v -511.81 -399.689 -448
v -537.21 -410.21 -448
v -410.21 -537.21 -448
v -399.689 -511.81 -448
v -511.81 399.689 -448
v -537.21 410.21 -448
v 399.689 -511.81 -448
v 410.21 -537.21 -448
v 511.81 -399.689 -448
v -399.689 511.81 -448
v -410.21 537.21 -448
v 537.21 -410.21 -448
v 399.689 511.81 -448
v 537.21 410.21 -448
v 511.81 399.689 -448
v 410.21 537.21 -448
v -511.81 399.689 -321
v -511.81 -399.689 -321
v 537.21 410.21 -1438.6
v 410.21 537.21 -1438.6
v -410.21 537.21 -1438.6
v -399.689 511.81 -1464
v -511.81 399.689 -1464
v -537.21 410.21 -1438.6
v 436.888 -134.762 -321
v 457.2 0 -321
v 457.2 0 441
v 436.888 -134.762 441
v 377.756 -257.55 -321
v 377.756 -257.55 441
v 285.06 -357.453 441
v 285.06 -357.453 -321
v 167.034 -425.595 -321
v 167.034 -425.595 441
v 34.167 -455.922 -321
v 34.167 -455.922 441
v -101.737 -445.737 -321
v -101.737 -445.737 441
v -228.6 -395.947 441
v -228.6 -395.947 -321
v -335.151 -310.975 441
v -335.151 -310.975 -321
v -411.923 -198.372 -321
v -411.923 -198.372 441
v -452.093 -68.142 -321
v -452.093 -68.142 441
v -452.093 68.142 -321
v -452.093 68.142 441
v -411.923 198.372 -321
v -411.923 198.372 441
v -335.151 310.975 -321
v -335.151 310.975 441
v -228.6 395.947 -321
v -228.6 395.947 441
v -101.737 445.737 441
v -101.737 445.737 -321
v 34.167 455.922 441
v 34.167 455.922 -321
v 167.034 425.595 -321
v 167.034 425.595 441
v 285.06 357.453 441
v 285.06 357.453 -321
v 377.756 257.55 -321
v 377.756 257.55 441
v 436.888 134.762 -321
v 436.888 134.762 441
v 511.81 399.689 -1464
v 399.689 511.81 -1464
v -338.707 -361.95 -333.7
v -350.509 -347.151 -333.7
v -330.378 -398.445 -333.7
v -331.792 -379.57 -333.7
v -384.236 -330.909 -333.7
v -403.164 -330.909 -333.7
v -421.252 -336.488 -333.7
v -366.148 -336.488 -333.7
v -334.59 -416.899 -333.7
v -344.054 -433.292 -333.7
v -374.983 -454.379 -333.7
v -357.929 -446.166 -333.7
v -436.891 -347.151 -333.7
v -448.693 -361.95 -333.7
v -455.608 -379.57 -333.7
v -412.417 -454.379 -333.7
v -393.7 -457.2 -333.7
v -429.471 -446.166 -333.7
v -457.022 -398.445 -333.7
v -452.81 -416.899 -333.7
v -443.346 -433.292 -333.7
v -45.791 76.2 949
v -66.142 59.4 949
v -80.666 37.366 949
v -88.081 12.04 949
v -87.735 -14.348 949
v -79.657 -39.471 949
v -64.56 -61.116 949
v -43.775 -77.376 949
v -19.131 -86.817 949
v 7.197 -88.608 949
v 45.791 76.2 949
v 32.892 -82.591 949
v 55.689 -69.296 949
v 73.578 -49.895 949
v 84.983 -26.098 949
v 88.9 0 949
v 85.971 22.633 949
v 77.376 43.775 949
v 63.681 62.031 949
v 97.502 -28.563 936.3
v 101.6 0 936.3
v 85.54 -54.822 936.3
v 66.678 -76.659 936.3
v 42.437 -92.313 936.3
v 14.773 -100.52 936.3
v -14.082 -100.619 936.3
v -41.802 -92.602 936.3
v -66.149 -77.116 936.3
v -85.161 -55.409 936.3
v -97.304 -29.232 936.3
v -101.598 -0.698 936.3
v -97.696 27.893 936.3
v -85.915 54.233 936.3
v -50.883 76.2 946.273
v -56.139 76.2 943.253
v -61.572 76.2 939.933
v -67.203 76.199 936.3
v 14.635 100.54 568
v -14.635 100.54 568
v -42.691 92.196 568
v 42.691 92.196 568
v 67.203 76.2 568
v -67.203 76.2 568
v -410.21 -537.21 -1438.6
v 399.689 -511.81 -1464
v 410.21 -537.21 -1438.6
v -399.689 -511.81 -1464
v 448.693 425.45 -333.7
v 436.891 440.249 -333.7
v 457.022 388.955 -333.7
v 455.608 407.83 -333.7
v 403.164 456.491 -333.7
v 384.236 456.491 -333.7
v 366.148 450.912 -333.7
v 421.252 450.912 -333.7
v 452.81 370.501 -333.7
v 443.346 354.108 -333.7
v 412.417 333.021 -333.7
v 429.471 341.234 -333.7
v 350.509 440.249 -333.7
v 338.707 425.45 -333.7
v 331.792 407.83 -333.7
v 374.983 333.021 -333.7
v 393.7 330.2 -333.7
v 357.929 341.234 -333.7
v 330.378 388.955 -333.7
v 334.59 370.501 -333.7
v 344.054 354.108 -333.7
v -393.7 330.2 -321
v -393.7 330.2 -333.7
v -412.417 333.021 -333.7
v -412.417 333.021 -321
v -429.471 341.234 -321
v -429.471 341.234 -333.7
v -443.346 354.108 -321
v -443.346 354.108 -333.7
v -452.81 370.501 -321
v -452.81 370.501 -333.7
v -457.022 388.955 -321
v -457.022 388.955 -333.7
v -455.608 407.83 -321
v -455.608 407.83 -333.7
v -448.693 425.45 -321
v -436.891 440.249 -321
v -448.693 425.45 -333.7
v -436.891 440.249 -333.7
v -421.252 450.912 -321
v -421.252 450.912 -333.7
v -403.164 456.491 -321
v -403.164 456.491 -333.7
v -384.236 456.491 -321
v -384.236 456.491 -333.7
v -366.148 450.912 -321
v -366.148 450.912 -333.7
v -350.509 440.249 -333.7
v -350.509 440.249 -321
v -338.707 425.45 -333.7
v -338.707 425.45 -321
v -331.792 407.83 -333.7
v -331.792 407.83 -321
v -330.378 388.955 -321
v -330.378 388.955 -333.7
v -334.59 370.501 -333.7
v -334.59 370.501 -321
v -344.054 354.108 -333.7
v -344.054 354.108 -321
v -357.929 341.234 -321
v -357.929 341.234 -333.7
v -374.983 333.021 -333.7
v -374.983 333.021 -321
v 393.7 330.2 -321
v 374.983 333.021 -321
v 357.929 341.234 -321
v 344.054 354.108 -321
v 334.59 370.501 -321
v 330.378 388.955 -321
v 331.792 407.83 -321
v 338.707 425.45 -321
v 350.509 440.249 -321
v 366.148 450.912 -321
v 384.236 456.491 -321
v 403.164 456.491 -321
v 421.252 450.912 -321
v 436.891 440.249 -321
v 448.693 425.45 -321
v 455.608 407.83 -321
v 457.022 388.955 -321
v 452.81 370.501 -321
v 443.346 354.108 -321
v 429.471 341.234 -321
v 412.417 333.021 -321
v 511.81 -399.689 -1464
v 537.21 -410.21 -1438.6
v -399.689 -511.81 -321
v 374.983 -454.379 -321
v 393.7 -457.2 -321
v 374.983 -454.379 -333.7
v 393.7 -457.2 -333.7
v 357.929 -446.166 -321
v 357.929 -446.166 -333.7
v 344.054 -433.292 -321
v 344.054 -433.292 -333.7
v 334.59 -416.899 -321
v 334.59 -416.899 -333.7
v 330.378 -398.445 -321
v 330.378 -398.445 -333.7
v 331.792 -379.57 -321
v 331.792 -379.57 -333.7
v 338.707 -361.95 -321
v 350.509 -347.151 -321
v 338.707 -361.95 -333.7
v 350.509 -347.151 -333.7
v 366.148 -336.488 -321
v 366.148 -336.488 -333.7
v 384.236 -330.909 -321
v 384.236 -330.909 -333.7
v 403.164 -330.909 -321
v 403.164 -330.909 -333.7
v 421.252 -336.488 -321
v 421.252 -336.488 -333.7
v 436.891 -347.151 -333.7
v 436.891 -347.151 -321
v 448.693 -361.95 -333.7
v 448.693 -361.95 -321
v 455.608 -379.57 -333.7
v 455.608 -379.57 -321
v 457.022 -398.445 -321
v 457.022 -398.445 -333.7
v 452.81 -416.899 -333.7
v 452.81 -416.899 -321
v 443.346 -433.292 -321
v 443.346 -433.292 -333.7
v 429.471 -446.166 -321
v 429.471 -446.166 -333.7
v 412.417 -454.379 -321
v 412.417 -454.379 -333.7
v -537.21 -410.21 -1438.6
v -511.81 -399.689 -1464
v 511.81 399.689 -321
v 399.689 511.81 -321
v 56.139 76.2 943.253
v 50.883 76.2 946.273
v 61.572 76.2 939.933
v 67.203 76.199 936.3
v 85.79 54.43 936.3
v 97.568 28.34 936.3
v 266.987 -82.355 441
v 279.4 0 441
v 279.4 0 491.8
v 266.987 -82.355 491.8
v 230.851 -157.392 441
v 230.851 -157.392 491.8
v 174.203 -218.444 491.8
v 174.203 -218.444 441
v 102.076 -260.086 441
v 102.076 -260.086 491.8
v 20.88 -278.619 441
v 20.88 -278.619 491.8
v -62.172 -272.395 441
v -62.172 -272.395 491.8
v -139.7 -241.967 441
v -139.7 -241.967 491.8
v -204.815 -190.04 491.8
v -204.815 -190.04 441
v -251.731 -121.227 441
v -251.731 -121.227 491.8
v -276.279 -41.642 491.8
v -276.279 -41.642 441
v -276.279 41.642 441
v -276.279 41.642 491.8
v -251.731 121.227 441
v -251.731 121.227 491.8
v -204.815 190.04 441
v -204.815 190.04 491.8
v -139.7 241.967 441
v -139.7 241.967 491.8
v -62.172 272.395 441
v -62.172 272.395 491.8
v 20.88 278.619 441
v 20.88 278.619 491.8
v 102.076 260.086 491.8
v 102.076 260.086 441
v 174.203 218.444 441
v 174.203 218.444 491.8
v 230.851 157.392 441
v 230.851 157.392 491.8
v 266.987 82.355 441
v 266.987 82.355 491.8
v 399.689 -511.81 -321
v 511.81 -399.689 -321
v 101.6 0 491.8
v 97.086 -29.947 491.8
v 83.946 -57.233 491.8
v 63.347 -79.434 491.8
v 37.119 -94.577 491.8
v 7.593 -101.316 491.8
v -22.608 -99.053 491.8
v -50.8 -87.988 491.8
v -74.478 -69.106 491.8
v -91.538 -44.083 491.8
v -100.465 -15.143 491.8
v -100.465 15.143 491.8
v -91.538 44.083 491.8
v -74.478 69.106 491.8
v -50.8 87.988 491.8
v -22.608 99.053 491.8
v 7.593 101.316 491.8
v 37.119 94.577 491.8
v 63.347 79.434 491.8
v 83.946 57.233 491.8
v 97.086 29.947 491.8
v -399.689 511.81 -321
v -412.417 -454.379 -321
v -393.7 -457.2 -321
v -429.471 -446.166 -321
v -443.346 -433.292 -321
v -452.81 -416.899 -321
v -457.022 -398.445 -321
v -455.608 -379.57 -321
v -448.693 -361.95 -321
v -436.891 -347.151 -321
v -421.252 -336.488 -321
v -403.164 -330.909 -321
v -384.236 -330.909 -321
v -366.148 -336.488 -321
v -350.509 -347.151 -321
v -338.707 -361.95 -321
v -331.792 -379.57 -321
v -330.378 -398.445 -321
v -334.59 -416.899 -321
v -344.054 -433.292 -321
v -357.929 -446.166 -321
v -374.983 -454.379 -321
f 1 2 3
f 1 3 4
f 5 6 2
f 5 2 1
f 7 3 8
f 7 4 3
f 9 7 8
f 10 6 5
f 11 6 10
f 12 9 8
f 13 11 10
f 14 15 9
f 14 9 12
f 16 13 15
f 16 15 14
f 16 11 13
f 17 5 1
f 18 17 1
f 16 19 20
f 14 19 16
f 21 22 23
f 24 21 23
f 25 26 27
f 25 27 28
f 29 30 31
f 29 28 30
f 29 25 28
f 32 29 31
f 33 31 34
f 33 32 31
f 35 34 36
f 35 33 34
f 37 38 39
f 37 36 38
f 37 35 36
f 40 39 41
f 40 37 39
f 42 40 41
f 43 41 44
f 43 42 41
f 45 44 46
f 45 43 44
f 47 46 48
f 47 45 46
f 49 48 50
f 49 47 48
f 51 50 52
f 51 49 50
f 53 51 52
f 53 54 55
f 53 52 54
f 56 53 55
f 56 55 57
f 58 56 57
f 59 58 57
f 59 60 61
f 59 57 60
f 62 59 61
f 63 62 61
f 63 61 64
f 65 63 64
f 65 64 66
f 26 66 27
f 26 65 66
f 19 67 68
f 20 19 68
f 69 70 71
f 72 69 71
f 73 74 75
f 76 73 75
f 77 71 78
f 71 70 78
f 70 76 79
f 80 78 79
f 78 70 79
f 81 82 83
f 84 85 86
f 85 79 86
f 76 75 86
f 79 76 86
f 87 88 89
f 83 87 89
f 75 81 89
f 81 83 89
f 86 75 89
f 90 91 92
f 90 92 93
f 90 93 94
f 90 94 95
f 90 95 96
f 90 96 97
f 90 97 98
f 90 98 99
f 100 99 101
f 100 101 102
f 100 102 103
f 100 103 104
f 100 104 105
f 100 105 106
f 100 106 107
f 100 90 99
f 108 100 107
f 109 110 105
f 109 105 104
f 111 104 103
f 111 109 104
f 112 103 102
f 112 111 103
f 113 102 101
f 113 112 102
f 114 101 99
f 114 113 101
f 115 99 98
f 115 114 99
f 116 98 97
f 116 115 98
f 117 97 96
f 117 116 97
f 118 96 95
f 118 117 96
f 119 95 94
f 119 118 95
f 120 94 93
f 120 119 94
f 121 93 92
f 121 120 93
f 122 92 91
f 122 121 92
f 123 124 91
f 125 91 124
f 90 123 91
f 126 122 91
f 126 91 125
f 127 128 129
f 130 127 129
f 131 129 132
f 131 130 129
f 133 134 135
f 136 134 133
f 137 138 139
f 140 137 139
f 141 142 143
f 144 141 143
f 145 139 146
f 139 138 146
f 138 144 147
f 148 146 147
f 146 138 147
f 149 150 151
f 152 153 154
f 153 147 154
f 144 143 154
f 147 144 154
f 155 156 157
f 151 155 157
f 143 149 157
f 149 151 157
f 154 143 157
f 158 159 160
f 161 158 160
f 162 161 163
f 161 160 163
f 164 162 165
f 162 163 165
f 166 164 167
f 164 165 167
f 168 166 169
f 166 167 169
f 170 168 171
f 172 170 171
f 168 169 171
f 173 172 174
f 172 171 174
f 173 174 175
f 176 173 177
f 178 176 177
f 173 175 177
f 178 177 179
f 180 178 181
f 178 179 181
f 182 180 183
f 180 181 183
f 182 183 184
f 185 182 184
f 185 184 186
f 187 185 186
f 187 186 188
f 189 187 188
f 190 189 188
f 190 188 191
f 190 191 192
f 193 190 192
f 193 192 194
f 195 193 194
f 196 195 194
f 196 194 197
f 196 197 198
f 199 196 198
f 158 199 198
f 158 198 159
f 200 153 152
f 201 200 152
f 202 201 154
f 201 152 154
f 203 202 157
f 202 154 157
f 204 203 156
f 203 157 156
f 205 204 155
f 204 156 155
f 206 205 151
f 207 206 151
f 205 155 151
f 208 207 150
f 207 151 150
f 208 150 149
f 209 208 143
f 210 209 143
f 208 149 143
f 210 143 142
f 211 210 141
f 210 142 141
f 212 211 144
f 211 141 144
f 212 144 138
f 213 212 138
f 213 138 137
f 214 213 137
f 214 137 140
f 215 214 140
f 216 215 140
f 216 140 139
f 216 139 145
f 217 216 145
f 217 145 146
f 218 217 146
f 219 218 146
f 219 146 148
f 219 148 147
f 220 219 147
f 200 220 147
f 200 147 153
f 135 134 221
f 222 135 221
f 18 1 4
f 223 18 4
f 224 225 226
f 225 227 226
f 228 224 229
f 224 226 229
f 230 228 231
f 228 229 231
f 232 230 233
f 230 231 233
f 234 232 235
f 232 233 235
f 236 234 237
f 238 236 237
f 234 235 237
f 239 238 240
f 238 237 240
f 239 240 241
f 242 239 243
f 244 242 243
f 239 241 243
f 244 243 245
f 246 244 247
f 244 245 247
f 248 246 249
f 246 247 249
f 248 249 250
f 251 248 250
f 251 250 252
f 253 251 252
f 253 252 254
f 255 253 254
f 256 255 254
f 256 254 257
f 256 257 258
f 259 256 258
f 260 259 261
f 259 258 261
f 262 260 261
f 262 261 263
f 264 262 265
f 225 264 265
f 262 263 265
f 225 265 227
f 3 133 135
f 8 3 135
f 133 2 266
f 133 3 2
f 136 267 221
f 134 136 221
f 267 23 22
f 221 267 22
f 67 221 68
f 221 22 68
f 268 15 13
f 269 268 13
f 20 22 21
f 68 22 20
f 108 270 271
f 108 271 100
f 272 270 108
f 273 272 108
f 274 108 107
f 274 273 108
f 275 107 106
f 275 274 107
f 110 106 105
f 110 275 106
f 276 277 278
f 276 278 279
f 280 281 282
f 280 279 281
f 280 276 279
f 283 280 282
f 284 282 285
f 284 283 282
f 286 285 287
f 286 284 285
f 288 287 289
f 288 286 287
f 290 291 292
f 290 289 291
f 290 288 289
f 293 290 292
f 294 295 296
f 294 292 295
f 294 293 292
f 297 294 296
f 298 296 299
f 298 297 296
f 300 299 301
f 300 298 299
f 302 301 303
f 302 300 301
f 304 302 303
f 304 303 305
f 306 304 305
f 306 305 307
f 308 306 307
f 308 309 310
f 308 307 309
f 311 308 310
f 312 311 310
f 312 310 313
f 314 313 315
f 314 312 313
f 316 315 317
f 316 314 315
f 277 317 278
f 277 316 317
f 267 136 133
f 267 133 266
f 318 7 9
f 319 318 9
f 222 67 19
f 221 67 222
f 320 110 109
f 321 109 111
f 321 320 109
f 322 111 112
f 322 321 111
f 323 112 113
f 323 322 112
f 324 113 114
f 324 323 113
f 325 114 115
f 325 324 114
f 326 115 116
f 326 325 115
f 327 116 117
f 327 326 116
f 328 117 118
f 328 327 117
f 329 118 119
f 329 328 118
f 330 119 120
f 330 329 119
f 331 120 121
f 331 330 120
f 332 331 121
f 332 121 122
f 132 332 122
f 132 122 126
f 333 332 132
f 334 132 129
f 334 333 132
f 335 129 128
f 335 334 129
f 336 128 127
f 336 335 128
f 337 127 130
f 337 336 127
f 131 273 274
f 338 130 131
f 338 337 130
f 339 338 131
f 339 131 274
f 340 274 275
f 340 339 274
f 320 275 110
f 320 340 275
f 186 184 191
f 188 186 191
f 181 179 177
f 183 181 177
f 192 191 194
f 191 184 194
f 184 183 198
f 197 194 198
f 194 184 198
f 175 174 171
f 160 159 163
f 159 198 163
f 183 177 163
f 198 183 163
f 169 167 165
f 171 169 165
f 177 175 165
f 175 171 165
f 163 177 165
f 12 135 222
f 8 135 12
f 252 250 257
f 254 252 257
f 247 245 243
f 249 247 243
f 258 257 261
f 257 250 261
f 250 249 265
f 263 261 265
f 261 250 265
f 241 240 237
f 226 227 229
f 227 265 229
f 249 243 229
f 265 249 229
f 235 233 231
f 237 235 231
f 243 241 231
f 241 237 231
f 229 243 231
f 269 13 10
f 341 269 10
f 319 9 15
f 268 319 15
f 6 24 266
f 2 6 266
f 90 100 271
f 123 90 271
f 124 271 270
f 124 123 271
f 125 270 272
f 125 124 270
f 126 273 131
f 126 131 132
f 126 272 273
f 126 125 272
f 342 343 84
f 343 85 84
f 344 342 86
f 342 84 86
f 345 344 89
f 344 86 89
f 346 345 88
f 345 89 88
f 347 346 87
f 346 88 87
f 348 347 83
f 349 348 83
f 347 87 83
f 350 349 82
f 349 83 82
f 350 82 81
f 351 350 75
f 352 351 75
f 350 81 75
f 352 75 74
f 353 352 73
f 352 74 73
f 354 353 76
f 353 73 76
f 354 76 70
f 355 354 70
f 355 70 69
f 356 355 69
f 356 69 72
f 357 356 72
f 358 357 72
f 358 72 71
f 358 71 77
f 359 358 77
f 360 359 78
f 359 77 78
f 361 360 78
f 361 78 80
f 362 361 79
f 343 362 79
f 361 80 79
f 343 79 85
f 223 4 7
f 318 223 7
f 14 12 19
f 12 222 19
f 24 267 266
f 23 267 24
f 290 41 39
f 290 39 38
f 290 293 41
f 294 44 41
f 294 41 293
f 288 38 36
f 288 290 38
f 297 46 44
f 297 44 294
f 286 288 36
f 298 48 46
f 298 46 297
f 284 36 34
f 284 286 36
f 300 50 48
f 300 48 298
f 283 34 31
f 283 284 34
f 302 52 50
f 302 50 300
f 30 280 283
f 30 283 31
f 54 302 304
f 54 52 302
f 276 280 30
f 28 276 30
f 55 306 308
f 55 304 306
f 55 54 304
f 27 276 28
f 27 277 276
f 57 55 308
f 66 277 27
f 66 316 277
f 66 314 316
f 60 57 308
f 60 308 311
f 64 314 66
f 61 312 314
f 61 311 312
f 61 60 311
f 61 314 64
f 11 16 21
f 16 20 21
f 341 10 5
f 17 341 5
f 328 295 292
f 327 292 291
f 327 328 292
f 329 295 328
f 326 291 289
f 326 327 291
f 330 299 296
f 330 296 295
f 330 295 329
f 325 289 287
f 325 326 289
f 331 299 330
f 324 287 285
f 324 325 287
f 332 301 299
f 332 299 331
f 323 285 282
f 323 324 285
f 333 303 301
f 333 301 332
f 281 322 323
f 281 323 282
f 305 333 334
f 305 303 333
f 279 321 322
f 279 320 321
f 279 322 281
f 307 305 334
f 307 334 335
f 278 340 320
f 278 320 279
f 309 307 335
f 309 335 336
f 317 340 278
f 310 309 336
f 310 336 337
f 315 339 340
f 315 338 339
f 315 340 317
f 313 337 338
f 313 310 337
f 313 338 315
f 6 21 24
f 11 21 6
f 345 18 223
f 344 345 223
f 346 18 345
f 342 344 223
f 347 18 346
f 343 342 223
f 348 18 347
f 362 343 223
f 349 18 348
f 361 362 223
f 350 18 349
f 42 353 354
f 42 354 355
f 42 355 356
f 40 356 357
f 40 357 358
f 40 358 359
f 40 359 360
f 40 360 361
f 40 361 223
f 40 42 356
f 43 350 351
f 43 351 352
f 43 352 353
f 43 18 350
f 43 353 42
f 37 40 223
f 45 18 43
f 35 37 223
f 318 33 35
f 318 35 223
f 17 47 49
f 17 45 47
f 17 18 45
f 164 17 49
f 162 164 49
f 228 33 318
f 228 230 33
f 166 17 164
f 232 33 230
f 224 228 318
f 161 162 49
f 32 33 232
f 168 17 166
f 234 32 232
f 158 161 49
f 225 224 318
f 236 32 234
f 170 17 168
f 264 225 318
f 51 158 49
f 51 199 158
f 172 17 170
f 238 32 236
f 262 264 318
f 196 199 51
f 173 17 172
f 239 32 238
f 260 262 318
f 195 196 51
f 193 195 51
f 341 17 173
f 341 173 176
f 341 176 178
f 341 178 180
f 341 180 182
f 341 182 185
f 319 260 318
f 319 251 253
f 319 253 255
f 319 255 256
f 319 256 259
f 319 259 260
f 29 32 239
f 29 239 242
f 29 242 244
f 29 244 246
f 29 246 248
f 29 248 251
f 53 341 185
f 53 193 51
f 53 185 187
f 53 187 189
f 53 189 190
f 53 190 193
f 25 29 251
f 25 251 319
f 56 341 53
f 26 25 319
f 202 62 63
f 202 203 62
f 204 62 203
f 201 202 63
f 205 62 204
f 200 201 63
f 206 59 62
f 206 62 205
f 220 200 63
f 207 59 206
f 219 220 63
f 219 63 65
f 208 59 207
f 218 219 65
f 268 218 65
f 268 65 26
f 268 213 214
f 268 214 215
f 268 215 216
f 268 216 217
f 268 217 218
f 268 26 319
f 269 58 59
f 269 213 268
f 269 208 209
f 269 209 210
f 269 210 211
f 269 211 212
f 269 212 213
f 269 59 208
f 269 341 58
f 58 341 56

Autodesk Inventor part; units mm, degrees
ref_plane "YZ Plane" through (0, 0, 0) normal (1, 0, 0) x (0, 1, 0)
ref_plane "XZ Plane" through (0, 0, 0) normal (0, 1, 0) x (-1, 0, 0)
ref_plane "XY Plane" through (0, 0, 0) normal (0, 0, 1) x (1, 0, 0)
sketch "Sketch1" plane through (0, 0, 0) normal (0, 0, 1) x (1, 0, 0)
  line L0 (-21.15, -21.15) -> (21.15, -21.15)
  line L1 (21.15, -21.15) -> (21.15, 21.15)
  line L2 (21.15, 21.15) -> (-21.15, 21.15)
  line L3 (-21.15, 21.15) -> (-21.15, -21.15)
  line L4 (-21.15, -21.15) -> (21.15, 21.15) construction
  line L5 (21.15, -21.15) -> (-21.15, 21.15) construction
  point P0 (0, 0)
  dimension "d0" = 42.3
  dimension "d1" = 42.3
extrude "Extrusion1" add sketch "Sketch1" along normal blind 40
chamfer "Chamfer1" distance 5 angle 45 4 edges at (21.15, -21.15, 20) (-21.15, -21.15, 20) (21.15, 21.15, 20) (-21.15, 21.15, 20)
sketch "Sketch2" plane through (0, 0, 40) normal (0, 0, 1) x (1, 0, 0)
  circle A0 centre (0, 0) radius 18
  dimension "d7" = 36
extrude "Extrusion2" add sketch "Sketch2" along normal blind 35
sketch "Sketch3" plane through (0, 0, 40) normal (0, 0, 1) x (1, 0, 0)
  circle A0 centre (0, 0) radius 18 projected
  line L0 (-21.15, 16.15) -> (-16.15, 21.15) projected
  line L1 (-21.15, 16.15) -> (-21.15, -16.15) projected
  line L2 (-16.15, -21.15) -> (-21.15, -16.15) projected
  line L3 (-16.15, -21.15) -> (16.15, -21.15) projected
  line L4 (21.15, -16.15) -> (16.15, -21.15) projected
  line L5 (21.15, -16.15) -> (21.15, 16.15) projected
  line L6 (16.15, 21.15) -> (21.15, 16.15) projected
  line L7 (16.15, 21.15) -> (-16.15, 21.15) projected
  line L8 (-15.7358, 20.15) -> (-20.15, 15.7358)
  line L9 (-20.15, 15.7358) -> (-20.15, -15.7358)
  line L10 (-20.15, -15.7358) -> (-15.7358, -20.15)
  line L11 (-15.7358, -20.15) -> (15.7358, -20.15)
  line L12 (15.7358, -20.15) -> (20.15, -15.7358)
  line L13 (20.15, -15.7358) -> (20.15, 15.7358)
  line L14 (20.15, 15.7358) -> (15.7358, 20.15)
  line L15 (15.7358, 20.15) -> (-15.7358, 20.15)
  dimension "d10" = 1
extrude "Extrusion3" add sketch "Sketch3" along normal blind 5 contours L15 L14 L13 L12 L11 L10 L9 L8
sketch "Sketch4" plane through (0, 0, 45) normal (0, 0, 1) x (1, 0, 0)
  line L0 (-15.5, -15.5) -> (15.5, -15.5) construction
  line L1 (15.5, -15.5) -> (15.5, 15.5) construction
  line L2 (15.5, 15.5) -> (-15.5, 15.5) construction
  line L3 (-15.5, 15.5) -> (-15.5, -15.5) construction
  line L4 (-15.5, -15.5) -> (15.5, 15.5) construction
  line L5 (15.5, -15.5) -> (-15.5, 15.5) construction
  point P0 (0, 0)
  dimension "d13" = 31
  dimension "d14" = 31
hole "Hole1" at (-15.5, 15.5, 45) at (15.5, 15.5, 45) at (-15.5, -15.5, 45) at (15.5, -15.5, 45) direction (0, 0, -1) diameter 5 depth 0.5
sketch "Sketch5" plane through (0, 0, 75) normal (0, 0, 1) x (1, 0, 0)
  circle A0 centre (0, 0) radius 11
  dimension "d22" = 22
extrude "Extrusion4" add sketch "Sketch5" along normal blind 2
sketch "Sketch6" plane through (0, 0, 77) normal (0, 0, 1) x (1, 0, 0)
  circle A0 centre (0, 0) radius 4
  dimension "d25" = 8
extrude "Extrusion5" add sketch "Sketch6" along normal blind 18
sketch "Sketch7" plane through (0, 0, 95) normal (0, 0, 1) x (1, 0, 0)
  line L0 (-2.6458, 4) -> (2.6458, 4)
  line L1 (2.6458, 4) -> (2.6458, 3)
  line L2 (2.6458, 3) -> (-2.6458, 3)
  line L3 (-2.6458, 3) -> (-2.6458, 4)
  circle A0 centre (0, 0) radius 4 projected
  line L4 (0, 0) -> (0, 4)
  circle A1 centre (0, 0) radius 4 projected
  point P0 (0, 3)
  dimension "d28" = 7
extrude "Extrusion6" cut sketch "Sketch7" against normal blind 15 contours L0 A0 L3 | L0 L1 A0 | L4 L2 A0 | A0 L2 L4
chamfer "Chamfer2" distance 0.5 angle 45 2 edges at (3.6458, 1.6458, 95) (-1.6458, -3.6458, 95)
chamfer "Chamfer3" distance 1 angle 45 8 edges at (0, 21.15, 0) (18.65, 18.65, 0) (21.15, 0, 0) (-21.15, 0, 0) (-18.65, 18.65, 0) (18.65, -18.65, 0) (0, -21.15, 0) (-18.65, -18.65, 0)
scale "Scale1" factors (25.4, 25.4, 25.4) then translate (0, 0, -1464) bodies 1
properties part number "motor con reductora"
